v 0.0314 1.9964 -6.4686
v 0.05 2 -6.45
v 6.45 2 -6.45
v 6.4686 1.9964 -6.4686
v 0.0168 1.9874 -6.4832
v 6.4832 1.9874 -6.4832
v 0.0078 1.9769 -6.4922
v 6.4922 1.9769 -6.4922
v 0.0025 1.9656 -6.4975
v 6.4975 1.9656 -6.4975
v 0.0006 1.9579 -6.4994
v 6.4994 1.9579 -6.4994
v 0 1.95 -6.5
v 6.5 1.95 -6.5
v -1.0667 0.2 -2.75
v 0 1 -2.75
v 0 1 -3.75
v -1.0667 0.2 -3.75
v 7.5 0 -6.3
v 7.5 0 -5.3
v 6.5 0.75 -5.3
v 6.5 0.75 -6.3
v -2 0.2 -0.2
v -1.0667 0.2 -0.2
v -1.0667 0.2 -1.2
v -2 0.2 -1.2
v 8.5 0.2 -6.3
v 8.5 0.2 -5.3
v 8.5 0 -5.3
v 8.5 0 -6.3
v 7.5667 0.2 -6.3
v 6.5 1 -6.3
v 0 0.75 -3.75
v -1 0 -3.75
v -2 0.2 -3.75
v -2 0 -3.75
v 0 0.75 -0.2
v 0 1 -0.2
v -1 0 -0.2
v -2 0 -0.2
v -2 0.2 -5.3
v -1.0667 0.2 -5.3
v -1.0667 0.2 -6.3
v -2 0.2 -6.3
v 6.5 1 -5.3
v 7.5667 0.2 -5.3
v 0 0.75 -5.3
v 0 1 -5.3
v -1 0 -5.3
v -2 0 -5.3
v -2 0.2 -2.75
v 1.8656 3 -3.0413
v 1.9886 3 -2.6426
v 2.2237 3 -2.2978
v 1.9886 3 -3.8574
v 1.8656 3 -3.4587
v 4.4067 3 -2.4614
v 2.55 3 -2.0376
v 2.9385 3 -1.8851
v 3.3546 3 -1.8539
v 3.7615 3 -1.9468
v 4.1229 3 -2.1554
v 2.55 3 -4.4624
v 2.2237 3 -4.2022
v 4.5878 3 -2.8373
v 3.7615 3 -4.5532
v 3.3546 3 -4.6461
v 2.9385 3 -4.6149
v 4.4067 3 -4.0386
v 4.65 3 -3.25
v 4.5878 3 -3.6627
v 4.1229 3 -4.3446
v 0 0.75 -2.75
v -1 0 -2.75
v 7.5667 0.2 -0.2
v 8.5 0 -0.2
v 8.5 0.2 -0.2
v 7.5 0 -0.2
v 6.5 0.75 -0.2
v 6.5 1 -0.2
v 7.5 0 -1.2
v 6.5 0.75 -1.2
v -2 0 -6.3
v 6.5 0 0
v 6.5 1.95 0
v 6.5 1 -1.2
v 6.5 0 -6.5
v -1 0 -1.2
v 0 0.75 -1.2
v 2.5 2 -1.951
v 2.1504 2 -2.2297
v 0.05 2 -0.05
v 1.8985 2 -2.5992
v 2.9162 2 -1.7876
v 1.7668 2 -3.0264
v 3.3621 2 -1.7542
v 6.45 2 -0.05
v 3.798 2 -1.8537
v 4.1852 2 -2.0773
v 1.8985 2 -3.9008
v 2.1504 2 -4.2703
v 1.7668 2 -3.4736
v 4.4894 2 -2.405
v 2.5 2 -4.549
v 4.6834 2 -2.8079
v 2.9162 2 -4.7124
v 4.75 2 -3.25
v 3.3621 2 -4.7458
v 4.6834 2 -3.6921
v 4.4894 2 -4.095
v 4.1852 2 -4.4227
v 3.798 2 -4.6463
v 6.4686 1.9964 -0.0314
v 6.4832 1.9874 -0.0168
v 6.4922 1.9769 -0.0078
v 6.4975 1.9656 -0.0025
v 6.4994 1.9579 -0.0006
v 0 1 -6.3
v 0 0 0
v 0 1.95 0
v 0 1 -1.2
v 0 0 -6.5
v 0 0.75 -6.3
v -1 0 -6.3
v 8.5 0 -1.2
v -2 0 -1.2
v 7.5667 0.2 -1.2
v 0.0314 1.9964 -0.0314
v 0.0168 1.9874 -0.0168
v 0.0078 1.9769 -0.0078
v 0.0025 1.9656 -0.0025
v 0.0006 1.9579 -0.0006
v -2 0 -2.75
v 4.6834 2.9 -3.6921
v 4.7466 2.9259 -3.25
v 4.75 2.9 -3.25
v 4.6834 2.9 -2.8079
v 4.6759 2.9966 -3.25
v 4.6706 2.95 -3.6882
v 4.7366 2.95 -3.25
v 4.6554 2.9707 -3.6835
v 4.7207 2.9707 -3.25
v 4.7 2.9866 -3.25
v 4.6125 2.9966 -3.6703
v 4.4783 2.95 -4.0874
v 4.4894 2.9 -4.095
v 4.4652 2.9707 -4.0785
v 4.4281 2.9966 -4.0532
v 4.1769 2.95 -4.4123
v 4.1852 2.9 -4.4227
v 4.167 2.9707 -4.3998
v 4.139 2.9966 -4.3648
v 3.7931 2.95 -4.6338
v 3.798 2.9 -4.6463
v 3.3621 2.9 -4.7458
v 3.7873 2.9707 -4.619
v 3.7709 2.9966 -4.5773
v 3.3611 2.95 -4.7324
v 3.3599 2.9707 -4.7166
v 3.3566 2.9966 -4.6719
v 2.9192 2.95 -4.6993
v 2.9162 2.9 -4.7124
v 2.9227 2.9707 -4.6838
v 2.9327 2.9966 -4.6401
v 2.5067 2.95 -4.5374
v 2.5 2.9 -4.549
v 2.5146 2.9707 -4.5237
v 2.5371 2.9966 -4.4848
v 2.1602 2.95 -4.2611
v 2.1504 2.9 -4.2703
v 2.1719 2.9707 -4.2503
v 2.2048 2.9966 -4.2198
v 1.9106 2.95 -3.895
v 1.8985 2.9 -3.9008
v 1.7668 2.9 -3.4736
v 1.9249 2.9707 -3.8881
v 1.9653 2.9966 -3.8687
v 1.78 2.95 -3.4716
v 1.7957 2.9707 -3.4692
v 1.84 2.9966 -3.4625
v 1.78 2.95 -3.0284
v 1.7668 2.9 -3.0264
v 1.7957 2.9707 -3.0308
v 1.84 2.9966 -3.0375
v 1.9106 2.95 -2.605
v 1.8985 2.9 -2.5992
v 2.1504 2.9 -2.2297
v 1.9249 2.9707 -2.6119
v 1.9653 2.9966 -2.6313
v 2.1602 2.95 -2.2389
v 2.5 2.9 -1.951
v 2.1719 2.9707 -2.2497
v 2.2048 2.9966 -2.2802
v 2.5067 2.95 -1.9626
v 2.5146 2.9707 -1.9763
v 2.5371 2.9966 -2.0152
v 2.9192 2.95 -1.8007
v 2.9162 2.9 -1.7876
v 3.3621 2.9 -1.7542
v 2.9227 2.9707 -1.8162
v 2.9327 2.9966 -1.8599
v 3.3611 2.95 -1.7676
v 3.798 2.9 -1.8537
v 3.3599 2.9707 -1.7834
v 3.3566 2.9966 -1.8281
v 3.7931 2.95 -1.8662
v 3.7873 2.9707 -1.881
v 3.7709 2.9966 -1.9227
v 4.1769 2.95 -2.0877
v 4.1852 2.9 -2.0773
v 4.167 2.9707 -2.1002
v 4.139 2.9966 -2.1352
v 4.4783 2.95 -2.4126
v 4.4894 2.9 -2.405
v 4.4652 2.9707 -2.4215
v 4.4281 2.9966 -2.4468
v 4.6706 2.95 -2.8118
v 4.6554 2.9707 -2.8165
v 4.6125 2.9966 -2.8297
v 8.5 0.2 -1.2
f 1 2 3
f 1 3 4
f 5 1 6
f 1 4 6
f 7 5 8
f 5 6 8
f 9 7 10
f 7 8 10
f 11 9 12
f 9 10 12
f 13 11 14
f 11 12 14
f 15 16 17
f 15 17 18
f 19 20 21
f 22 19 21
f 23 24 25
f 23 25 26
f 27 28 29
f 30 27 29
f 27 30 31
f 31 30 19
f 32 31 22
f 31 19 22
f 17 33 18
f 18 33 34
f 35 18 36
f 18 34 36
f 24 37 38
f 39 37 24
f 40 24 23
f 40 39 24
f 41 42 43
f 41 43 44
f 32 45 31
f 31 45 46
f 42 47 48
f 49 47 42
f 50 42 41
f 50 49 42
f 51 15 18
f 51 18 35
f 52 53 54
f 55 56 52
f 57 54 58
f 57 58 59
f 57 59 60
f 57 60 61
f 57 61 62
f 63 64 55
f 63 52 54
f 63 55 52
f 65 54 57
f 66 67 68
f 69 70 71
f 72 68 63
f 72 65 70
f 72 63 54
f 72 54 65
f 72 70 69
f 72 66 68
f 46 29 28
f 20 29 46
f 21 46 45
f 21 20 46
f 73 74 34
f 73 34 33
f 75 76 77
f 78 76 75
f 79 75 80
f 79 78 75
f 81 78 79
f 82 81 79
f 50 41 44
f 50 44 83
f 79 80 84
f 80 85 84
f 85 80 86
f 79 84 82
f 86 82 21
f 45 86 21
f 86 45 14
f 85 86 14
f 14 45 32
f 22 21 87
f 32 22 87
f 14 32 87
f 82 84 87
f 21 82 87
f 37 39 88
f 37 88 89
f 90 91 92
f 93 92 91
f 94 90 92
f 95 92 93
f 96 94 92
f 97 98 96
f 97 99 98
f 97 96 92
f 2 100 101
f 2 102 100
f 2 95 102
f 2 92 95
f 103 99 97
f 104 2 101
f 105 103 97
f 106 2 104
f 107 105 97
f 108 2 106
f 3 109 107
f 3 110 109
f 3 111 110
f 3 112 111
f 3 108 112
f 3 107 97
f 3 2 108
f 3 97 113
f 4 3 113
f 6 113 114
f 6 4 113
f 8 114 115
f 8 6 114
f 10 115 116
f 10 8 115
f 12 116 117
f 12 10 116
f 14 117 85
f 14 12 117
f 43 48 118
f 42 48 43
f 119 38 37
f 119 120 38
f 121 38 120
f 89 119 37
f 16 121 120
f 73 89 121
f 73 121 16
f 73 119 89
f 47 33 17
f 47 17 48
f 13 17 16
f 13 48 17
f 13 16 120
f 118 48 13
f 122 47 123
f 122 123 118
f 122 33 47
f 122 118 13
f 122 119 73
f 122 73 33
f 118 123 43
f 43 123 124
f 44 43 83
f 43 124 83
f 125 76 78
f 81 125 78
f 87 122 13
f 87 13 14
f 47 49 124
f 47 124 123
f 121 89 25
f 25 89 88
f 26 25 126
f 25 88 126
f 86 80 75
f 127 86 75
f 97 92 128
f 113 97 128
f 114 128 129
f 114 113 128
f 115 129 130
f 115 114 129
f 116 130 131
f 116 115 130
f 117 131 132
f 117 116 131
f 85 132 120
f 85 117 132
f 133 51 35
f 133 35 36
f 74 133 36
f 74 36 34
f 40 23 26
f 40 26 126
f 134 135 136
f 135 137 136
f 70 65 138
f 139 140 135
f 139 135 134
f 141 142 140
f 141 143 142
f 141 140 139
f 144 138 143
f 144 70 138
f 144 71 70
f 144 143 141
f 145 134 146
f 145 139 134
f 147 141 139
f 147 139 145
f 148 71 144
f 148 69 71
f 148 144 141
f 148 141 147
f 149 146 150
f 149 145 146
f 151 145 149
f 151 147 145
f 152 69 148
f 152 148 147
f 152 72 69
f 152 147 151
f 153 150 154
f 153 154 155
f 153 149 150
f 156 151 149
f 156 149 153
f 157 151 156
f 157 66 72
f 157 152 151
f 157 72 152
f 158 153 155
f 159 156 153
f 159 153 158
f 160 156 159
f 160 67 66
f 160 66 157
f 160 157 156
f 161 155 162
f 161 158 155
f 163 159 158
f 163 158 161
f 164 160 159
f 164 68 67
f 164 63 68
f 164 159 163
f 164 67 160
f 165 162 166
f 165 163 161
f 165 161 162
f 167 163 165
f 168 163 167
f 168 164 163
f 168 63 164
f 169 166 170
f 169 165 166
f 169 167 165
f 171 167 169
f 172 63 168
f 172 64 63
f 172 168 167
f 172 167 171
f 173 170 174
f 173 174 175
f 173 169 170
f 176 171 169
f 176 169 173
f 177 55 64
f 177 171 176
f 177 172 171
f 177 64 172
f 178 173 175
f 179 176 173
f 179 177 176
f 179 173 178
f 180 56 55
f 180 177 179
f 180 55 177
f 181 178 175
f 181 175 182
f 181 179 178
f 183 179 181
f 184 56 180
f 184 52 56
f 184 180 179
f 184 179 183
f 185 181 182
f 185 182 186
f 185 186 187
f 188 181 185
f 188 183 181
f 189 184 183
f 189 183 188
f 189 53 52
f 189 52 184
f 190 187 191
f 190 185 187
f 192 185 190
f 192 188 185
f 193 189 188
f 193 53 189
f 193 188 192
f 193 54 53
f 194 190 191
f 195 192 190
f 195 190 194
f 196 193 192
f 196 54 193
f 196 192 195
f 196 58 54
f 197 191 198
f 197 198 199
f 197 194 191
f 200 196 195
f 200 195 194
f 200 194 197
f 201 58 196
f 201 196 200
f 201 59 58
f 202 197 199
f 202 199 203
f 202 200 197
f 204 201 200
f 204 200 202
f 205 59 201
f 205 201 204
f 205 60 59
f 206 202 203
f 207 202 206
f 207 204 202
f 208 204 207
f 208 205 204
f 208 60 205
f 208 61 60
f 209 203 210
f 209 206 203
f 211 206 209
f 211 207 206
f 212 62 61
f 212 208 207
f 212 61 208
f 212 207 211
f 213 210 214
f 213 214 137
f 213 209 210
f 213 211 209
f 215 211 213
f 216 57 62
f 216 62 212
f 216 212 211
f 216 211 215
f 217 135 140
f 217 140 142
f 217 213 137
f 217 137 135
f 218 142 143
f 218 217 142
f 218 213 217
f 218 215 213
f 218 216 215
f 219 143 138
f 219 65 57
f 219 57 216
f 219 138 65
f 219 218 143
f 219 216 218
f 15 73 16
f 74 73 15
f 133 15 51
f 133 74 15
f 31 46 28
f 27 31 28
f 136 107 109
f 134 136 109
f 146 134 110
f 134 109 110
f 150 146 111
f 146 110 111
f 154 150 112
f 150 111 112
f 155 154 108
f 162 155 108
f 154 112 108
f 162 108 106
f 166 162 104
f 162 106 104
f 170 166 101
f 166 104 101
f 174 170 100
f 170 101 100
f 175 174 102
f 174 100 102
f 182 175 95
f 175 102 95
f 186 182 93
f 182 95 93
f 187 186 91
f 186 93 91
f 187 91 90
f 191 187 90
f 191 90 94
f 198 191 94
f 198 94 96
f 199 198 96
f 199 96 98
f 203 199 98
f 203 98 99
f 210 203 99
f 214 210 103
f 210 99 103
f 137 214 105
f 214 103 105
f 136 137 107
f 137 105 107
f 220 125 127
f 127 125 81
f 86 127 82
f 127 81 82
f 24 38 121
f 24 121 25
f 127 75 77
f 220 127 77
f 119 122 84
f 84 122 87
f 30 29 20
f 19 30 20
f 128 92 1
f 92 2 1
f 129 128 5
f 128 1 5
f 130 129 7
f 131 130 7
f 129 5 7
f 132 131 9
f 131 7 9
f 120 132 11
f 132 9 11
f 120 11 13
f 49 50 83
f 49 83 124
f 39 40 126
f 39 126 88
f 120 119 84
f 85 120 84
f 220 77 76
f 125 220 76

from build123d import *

# Parameters (mm, degrees)
SKETCH1_W           = 6.5
SKETCH1_H           = 6.5
BOSS_EXTRUDE1_DEPTH = 2
SKETCH2_R           = 1.5
BOSS_EXTRUDE2_DEPTH = 1
FILLET1_R           = 0.1
FILLET2_R           = 0.05
BOSS_EXTRUDE3_DEPTH = 6.5
SKETCH4_W           = 2
SKETCH4_H           = 1.55
SKETCH4_H_2         = 4.1
SKETCH4_H_3         = 0.2
CUT_EXTRUDE1_DEPTH  = 4


with BuildPart() as part:
    # Sketch1 → Boss-Extrude1 (new body)
    with BuildSketch(Plane(origin=(0, 0, 0), x_dir=(1, 0, 0), z_dir=(0, 1, 0))):
        with Locations((3.25, 3.25)):
            Rectangle(SKETCH1_W, SKETCH1_H)
    extrude(amount=BOSS_EXTRUDE1_DEPTH)

    # Sketch2 → Boss-Extrude2 (add)
    with BuildSketch(Plane(origin=(0, 2, 0), x_dir=(1, 0, 0), z_dir=(0, 1, 0))):
        with Locations((3.25, 3.25)):
            Circle(SKETCH2_R)
    extrude(amount=BOSS_EXTRUDE2_DEPTH)

    # Fillet1
    fillet1_edges = [part.edges().sort_by_distance(p)[0] for p in [
        (1.75, 3, -3.25),
    ]]
    fillet(fillet1_edges, radius=FILLET1_R)

    # Fillet2
    fillet2_edges = [part.edges().sort_by_distance(p)[0] for p in [
        (6.5, 2, -3.25),
        (3.25, 2, -6.5),
        (0, 2, -3.25),
        (3.25, 2, 0),
    ]]
    fillet(fillet2_edges, radius=FILLET2_R)

    # Sketch3 → Boss-Extrude3 (add, through all)
    with BuildSketch(Plane.XY):
        Polygon((6.5, 1), (7.566666667, 0.2), (8.5, 0.2), (8.5, 0), (7.5, 0), (6.5, 0.75), align=None)
        Polygon((-2, 0), (-1, 0), (0, 0.75), (0, 1), (-1.066666667, 0.2), (-2, 0.2), align=None)
    extrude(amount=-BOSS_EXTRUDE3_DEPTH)

    # Sketch4 → Cut-Extrude1 (cut, through all)
    with BuildSketch(Plane(origin=(0, 0, 0), x_dir=(-1, 0, 0), z_dir=(0, -1, 0))):
        with Locations((1, 1.975)):
            Rectangle(SKETCH4_W, SKETCH4_H)
        with Locations((1, 4.525)):
            Rectangle(SKETCH4_W, SKETCH4_H)
        with Locations((-7.5, 3.25)):
            Rectangle(SKETCH4_W, SKETCH4_H_2)
        with Locations((1, 0.1)):
            Rectangle(SKETCH4_W, SKETCH4_H_3)
        with Locations((1, 6.4)):
            Rectangle(SKETCH4_W, SKETCH4_H_3)
        with Locations((-7.5, 6.4)):
            Rectangle(SKETCH4_W, SKETCH4_H_3)
        with Locations((-7.5, 0.1)):
            Rectangle(SKETCH4_W, SKETCH4_H_3)
    extrude(amount=-CUT_EXTRUDE1_DEPTH, mode=Mode.SUBTRACT)


solid = part.part
